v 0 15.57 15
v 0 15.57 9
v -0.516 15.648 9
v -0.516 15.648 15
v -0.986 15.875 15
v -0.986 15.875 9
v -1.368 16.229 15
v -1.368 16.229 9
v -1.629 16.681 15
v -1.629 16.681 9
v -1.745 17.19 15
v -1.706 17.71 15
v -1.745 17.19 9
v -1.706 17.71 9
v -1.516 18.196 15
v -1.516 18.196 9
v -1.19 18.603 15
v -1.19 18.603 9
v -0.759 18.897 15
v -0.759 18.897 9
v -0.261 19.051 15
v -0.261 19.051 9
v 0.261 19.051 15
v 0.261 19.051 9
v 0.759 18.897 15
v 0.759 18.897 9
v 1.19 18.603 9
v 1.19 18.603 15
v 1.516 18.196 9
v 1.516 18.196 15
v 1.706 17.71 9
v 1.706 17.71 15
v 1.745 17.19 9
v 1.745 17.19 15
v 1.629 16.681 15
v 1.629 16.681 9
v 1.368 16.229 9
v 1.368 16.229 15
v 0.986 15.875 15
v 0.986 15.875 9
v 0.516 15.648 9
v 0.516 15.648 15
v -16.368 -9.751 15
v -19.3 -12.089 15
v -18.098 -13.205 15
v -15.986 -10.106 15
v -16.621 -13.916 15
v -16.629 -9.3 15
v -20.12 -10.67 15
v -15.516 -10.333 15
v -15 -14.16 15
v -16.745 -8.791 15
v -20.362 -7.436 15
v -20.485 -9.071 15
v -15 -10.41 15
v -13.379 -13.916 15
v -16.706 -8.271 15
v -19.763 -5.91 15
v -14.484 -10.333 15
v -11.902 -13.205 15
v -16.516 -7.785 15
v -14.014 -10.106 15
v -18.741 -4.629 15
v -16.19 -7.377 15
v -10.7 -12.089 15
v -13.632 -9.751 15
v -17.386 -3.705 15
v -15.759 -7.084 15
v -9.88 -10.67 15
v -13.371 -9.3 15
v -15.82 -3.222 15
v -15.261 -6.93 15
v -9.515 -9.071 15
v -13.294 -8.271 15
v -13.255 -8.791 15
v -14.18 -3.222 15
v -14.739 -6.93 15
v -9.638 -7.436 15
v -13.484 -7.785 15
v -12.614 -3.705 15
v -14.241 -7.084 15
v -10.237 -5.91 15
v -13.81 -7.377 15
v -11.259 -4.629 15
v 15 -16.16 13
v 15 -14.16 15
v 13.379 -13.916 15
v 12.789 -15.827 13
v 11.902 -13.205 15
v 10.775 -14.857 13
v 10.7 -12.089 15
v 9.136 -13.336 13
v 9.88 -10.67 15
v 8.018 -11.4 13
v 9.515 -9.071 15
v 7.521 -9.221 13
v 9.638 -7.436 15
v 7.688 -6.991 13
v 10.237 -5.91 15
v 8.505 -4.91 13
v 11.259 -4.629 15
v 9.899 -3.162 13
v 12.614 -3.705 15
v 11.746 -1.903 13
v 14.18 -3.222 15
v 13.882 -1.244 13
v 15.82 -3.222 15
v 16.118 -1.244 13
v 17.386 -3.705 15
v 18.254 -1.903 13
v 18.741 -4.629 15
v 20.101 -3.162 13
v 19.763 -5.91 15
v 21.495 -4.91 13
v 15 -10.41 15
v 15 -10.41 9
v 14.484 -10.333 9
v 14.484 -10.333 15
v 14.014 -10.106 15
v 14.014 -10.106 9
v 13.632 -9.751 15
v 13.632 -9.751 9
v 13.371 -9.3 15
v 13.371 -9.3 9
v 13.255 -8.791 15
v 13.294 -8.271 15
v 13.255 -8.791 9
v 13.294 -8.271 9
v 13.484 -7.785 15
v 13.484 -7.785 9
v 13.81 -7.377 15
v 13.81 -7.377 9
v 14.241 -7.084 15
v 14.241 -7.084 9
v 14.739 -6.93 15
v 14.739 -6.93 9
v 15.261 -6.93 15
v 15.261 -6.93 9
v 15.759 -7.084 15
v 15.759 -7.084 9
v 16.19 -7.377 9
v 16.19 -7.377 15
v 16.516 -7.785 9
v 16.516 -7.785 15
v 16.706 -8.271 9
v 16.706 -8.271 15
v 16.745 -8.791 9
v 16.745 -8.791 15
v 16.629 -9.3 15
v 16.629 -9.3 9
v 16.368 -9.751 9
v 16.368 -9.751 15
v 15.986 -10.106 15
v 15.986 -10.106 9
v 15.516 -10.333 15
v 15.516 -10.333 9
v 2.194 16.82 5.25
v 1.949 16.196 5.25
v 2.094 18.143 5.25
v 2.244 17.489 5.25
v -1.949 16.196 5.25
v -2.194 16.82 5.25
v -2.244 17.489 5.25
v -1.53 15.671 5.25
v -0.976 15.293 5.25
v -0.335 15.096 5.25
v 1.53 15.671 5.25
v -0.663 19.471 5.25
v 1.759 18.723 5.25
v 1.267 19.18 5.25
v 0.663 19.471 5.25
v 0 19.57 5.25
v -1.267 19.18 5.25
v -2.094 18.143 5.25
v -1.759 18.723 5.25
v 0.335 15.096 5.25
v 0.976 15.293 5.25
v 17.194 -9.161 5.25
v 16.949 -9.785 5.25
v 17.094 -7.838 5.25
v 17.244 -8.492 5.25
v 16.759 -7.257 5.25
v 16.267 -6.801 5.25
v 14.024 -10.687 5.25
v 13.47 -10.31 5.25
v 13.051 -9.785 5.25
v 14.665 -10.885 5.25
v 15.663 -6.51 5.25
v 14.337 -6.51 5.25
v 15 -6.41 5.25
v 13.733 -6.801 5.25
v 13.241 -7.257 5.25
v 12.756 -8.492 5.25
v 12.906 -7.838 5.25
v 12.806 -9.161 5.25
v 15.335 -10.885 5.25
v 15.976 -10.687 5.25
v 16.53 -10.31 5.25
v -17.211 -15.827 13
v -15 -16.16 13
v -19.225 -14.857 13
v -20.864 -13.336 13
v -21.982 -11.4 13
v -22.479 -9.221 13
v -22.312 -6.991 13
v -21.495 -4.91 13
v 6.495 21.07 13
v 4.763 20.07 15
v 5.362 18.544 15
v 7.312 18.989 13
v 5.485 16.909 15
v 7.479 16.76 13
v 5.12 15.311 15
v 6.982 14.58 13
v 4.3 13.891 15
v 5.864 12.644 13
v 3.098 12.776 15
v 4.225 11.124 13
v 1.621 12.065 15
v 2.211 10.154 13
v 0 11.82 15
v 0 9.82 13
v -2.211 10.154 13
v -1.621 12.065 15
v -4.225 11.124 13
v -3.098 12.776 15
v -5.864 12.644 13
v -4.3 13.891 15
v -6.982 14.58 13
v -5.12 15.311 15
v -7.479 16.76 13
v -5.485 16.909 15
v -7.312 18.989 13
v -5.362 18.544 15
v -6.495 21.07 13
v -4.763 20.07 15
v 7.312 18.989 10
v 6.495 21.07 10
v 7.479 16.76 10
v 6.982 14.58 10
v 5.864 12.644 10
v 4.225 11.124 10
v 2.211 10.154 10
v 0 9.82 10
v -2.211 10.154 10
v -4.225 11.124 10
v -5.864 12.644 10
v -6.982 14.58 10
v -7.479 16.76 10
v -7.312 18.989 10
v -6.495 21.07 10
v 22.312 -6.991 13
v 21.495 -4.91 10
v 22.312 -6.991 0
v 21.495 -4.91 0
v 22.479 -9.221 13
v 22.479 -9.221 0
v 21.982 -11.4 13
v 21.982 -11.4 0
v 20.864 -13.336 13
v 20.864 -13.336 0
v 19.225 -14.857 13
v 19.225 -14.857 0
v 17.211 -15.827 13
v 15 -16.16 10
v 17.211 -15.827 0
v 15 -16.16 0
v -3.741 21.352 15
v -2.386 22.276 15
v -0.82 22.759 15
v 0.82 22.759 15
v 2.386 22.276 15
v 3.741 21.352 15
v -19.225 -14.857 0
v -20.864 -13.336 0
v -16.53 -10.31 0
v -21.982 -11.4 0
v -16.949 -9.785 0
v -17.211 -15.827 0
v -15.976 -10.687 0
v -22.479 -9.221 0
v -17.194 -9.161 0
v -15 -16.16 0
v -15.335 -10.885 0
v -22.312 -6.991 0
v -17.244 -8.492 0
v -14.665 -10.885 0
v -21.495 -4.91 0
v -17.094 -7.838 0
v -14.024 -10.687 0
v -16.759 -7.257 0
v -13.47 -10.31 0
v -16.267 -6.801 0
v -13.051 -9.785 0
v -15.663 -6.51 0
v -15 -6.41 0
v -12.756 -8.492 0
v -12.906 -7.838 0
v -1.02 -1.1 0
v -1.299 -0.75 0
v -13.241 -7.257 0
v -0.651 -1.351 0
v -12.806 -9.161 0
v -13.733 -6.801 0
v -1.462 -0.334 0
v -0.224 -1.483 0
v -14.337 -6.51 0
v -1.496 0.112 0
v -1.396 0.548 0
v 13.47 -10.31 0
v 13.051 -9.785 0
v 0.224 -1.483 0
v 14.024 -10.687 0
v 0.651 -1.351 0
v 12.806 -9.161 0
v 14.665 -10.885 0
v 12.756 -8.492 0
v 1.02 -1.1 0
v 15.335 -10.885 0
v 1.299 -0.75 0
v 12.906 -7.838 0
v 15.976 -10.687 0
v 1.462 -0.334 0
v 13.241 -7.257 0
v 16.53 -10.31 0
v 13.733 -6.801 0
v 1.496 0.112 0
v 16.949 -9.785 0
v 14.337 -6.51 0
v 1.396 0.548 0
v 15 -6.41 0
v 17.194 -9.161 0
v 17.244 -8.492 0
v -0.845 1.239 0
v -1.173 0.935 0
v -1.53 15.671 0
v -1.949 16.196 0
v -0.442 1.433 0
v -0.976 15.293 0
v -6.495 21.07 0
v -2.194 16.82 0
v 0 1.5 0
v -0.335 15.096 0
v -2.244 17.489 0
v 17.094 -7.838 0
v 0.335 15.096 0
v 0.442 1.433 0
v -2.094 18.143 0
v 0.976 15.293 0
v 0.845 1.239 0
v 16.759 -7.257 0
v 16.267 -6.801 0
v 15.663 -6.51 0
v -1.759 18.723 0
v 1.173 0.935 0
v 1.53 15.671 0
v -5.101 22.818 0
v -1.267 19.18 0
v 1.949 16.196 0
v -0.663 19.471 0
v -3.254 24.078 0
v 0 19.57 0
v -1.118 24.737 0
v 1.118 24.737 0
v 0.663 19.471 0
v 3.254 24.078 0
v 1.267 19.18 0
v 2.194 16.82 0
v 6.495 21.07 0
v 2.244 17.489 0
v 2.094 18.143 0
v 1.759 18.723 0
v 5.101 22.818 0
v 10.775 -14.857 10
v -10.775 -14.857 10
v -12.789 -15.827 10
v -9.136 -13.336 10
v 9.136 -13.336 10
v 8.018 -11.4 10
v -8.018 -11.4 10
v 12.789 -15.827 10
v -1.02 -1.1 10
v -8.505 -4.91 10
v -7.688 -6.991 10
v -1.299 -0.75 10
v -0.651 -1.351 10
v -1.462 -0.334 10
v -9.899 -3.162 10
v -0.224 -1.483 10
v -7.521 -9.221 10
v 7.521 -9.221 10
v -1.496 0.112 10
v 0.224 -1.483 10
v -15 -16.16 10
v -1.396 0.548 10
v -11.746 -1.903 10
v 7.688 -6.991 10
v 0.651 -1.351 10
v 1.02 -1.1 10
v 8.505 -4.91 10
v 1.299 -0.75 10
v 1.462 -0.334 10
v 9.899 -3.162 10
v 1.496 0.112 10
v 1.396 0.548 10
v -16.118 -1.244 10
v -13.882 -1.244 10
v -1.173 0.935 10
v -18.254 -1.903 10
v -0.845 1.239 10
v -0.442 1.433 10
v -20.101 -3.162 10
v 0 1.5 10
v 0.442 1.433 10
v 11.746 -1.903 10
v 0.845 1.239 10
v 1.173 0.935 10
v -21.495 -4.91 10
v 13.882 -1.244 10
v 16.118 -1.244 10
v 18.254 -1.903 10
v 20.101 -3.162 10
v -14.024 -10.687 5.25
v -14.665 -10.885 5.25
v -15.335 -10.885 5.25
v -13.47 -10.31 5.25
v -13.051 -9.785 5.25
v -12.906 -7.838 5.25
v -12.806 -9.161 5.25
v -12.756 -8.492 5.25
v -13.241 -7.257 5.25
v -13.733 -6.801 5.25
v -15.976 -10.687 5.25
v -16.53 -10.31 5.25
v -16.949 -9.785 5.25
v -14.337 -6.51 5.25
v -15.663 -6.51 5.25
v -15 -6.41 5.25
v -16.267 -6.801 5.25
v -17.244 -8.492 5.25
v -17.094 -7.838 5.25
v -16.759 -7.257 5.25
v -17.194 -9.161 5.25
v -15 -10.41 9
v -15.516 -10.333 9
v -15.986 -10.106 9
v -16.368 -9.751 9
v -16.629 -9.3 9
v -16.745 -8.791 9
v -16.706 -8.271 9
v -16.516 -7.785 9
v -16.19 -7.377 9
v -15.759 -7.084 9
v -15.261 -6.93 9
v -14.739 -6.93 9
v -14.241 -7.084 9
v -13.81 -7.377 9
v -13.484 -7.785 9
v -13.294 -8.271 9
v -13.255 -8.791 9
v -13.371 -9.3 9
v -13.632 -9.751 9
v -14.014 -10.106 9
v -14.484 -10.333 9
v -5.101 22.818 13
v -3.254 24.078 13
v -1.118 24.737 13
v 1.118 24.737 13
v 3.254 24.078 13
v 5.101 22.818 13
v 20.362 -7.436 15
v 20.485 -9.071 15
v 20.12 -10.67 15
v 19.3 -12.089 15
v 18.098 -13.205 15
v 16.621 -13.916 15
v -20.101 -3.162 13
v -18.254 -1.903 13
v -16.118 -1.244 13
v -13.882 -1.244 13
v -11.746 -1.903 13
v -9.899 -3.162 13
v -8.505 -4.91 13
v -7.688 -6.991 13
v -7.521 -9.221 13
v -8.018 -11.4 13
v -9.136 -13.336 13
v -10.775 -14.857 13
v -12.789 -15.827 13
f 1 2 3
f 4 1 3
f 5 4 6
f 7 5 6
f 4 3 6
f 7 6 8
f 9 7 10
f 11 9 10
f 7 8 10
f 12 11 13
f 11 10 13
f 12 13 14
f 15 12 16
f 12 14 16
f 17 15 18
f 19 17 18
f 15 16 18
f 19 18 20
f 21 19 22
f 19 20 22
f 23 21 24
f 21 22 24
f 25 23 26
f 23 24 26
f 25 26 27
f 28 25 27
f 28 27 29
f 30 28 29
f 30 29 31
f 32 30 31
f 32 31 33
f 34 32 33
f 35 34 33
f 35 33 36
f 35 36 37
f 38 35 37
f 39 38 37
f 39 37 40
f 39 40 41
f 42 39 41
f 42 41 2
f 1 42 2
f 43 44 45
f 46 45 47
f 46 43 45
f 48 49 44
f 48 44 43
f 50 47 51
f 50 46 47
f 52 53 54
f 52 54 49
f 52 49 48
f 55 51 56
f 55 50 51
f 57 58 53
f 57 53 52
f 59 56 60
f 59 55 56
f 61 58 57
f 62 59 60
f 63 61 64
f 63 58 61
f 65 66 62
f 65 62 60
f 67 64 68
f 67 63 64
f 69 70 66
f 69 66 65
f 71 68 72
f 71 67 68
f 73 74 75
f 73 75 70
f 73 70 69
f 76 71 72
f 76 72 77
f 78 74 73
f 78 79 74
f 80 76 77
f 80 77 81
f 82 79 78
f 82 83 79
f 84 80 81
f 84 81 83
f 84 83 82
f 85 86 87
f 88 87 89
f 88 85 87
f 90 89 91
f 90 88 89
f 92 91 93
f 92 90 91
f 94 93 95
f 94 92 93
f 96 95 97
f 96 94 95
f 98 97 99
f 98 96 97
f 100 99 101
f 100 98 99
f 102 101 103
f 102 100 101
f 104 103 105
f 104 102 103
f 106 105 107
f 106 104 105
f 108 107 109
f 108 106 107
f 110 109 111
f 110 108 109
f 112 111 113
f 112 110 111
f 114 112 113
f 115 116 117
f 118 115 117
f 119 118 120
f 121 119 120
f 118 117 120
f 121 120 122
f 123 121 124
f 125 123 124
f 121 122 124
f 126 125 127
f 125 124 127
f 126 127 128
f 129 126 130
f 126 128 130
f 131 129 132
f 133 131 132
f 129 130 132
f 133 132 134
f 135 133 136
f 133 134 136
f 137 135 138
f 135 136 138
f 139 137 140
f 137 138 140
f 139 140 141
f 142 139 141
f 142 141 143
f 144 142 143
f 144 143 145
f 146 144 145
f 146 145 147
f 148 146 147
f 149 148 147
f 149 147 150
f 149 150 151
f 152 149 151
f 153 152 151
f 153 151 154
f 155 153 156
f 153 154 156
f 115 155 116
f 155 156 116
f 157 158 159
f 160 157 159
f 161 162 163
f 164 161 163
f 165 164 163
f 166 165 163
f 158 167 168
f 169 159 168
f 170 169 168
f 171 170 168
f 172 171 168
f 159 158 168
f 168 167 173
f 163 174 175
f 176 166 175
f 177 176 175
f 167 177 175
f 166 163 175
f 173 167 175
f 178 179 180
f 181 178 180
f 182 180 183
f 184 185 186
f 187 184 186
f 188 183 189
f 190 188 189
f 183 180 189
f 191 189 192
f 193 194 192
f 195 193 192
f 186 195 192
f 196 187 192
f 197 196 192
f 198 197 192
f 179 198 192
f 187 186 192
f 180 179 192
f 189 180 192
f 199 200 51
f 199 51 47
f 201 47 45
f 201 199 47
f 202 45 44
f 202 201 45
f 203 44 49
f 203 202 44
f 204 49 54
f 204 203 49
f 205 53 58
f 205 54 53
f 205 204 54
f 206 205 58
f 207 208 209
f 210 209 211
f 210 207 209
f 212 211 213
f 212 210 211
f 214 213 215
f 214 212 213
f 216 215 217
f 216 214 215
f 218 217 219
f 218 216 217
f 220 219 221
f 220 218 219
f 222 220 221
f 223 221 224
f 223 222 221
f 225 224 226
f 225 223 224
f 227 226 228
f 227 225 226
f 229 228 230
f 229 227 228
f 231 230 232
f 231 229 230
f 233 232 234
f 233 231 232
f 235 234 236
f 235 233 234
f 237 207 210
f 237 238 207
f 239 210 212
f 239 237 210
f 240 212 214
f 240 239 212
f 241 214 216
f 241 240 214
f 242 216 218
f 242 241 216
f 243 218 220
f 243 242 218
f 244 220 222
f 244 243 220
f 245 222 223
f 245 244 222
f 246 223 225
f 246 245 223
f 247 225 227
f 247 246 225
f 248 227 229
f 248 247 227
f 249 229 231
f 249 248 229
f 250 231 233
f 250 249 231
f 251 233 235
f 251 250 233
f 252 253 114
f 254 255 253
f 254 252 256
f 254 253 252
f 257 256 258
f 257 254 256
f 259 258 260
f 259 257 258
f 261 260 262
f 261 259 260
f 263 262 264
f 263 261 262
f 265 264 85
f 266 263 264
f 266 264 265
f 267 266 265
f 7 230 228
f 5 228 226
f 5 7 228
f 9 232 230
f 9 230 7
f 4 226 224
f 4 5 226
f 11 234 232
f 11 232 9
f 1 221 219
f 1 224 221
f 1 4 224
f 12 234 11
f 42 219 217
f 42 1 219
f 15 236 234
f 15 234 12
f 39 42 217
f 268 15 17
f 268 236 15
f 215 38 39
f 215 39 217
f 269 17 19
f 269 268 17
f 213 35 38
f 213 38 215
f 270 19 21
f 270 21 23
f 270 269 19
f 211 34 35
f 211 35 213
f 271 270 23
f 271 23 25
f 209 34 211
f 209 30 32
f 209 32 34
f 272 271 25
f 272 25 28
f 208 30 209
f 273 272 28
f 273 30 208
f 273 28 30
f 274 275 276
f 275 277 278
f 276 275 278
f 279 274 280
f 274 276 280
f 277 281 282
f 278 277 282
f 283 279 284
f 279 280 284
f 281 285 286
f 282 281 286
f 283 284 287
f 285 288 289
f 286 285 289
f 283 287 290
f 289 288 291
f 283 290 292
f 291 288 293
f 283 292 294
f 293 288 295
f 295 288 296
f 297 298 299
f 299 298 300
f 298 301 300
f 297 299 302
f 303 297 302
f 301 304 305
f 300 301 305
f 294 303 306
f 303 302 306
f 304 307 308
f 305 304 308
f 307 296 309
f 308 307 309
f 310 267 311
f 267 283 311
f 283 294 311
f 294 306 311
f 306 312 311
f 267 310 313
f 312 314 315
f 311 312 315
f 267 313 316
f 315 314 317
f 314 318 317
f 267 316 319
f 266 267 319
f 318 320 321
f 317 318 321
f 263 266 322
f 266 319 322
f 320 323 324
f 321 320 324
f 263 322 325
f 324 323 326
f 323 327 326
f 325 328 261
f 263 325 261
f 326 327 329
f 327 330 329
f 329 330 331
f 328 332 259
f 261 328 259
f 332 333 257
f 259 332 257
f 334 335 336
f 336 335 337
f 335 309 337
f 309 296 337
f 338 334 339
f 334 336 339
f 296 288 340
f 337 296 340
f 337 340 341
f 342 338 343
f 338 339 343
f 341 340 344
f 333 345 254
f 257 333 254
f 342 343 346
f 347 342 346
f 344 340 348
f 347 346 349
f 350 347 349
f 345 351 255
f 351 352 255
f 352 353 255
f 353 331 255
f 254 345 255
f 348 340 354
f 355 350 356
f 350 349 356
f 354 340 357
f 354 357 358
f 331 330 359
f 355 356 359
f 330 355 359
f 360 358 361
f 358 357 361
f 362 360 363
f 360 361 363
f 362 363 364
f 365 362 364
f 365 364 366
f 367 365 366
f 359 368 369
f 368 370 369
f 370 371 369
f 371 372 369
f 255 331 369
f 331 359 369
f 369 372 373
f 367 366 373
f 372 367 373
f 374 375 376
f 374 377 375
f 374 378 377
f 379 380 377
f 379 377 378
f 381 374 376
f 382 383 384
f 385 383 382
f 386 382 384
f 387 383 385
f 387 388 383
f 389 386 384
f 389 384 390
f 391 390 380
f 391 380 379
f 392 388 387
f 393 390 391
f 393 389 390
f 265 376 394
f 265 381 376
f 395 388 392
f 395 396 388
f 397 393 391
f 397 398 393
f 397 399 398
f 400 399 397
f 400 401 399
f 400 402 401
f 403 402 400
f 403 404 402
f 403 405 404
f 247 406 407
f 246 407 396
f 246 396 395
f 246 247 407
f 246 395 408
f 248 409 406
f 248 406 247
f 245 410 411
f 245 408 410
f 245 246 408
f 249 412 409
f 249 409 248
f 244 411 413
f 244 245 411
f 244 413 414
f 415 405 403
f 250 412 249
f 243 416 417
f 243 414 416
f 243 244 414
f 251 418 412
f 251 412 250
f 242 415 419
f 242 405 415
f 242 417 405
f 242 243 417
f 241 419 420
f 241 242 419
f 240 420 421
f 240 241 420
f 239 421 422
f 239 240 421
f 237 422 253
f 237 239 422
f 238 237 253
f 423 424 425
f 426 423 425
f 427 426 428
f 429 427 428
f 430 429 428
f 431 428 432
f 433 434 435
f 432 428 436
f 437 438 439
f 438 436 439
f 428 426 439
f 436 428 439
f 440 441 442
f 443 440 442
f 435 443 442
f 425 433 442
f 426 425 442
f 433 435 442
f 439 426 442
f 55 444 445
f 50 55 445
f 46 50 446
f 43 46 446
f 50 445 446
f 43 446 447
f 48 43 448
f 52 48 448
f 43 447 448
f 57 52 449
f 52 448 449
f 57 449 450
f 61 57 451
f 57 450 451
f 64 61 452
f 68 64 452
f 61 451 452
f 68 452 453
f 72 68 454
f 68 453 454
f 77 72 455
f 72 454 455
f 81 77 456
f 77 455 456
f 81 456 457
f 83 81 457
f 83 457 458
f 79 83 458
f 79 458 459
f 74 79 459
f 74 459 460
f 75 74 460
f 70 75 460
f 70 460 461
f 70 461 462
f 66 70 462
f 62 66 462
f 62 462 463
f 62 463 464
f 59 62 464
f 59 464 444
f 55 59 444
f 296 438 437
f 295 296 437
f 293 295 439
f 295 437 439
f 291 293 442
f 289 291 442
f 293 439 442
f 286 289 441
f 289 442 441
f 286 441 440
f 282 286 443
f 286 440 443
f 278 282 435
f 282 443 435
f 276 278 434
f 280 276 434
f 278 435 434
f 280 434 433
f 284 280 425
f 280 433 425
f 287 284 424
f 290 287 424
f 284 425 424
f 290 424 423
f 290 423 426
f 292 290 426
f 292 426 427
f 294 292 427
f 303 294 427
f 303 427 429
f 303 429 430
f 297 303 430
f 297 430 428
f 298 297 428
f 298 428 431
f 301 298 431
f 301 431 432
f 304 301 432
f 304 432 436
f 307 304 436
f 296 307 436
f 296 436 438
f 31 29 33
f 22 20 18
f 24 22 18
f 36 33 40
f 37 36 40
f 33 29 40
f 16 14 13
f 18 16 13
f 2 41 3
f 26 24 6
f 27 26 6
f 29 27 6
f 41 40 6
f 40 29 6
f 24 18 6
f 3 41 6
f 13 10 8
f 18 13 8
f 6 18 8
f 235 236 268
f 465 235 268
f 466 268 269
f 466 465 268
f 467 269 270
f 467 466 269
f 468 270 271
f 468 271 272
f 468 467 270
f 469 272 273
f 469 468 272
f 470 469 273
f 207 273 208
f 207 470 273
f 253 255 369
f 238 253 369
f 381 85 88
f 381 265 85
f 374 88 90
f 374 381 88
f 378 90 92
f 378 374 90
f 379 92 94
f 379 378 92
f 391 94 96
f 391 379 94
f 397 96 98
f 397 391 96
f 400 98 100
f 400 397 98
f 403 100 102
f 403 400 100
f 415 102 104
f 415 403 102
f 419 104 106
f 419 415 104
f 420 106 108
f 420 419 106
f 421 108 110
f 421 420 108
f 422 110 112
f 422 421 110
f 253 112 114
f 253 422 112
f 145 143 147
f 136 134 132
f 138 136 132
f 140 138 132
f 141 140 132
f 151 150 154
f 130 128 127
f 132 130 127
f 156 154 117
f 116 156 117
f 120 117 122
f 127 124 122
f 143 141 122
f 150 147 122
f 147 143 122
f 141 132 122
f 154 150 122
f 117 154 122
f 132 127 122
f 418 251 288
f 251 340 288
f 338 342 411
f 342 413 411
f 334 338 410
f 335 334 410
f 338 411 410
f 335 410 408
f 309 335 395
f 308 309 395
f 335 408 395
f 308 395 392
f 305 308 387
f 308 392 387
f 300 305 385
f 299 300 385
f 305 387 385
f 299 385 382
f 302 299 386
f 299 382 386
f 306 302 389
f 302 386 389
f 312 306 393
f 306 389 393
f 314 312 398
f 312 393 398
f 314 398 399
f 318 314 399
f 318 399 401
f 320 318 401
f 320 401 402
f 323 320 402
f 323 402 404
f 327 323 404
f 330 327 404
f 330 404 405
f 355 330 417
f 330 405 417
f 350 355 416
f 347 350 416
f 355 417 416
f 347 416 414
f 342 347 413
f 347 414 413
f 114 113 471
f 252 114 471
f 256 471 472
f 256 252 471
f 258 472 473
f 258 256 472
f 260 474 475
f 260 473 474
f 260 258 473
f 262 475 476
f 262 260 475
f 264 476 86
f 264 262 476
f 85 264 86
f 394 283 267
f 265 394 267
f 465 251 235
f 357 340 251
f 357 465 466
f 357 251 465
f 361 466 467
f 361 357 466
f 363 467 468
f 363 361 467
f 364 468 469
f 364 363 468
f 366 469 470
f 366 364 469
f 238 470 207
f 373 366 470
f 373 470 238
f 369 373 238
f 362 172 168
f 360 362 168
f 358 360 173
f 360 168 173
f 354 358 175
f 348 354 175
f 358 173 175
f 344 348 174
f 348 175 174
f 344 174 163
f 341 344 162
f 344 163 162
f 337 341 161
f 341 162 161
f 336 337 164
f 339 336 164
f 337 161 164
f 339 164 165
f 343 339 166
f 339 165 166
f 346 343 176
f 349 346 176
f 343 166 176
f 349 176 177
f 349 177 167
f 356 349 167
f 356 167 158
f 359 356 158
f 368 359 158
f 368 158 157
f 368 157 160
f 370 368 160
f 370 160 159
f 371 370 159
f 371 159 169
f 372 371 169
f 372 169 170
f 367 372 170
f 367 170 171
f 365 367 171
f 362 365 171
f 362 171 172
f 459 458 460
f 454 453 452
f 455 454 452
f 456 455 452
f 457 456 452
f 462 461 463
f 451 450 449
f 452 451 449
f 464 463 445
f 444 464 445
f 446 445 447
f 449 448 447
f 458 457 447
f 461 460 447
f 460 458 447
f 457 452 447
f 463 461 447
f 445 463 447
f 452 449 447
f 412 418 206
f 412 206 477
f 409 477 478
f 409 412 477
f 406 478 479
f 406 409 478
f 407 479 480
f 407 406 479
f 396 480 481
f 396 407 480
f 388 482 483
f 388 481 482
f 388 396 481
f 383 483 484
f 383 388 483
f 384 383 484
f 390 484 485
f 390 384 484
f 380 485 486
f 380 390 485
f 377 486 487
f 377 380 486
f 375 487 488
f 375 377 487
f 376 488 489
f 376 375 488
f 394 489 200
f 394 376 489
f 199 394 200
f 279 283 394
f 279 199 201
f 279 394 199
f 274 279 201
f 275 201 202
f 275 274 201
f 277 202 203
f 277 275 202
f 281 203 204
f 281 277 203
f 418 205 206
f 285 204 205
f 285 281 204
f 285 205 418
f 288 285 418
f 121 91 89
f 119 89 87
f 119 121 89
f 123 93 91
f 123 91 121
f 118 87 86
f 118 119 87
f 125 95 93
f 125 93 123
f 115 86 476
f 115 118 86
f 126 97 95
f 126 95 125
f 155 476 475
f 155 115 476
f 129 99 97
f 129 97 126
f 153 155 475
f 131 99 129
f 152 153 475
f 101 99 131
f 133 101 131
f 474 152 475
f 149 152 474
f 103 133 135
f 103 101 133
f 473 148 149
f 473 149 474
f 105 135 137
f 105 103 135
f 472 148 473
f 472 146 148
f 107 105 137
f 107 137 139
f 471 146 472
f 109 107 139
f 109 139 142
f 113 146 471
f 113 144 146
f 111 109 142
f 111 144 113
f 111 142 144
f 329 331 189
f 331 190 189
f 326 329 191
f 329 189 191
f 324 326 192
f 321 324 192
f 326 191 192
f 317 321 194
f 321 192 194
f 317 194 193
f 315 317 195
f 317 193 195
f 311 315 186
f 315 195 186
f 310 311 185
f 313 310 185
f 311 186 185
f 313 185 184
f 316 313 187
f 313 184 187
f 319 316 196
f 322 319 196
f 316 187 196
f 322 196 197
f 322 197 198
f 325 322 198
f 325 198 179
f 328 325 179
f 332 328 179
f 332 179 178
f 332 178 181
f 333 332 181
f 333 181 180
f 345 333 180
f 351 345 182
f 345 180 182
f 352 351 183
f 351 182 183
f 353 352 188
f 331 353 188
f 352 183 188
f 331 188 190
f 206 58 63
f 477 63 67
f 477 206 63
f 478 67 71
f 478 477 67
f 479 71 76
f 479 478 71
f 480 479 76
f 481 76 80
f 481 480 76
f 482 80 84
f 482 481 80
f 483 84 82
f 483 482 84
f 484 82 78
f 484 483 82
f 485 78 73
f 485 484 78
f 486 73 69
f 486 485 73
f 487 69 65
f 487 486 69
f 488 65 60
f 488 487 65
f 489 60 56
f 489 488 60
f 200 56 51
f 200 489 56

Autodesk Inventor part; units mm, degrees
ref_plane "YZ Plane" through (0, 0, 0) normal (1, 0, 0) x (0, 1, 0)
ref_plane "XZ Plane" through (0, 0, 0) normal (0, 1, 0) x (-1, 0, 0)
ref_plane "XY Plane" through (0, 0, 0) normal (0, 0, 1) x (1, 0, 0)
sketch "Sketch1" plane through (0, 0, 0) normal (0, 0, 1) x (1, 0, 0)
  circle A0 centre (0, 0) radius 2 projected
  circle A1 centre (0, 17.3205) radius 2 projected
  circle A2 centre (-15, -8.6603) radius 2 projected
  circle A3 centre (15, -8.6603) radius 2 projected
  line L0 (-15, -16.1603) -> (15, -16.1603)
  line L1 (21.4952, -4.9103) -> (6.4952, 21.0705)
  line L2 (-6.4952, 21.0705) -> (-21.4952, -4.9103)
  arc A4 (6.4952, 21.0705) -> (-6.4952, 21.0705) centre (0, 17.3205) ccw
  arc A5 (15, -16.1603) -> (21.4952, -4.9103) centre (15, -8.6603) ccw
  arc A6 (-21.4952, -4.9103) -> (-15, -16.1603) centre (-15, -8.6603) ccw
  line L3 (15.512, -26.8675) -> (-15.512, -26.8675) projected
  line L4 (15.512, 26.8675) -> (31.0239, 0) projected
  line L5 (-31.0239, 0) -> (-15.512, 26.8675) projected
  line L6 (-31.0239, 0) -> (-15.512, -26.8675) projected
  line L7 (15.512, -26.8675) -> (31.0239, 0) projected
  line L8 (15.512, 26.8675) -> (-15.512, 26.8675) projected
  point P0 (0, 0)
  dimension "d3" = 7.5
extrude "Extrusion1" add sketch "Sketch1" along normal blind 10 contours A0 | A1 | A2 | A3 | A6 L2 A4 L1 A5 L0
sketch "Sketch2" plane through (0, 0, 0) normal (0, 0, -1) x (-1, 0, 0)
  arc A0 (15, -16.1603) -> (21.4952, -4.9103) centre (15, -8.6603) ccw projected
  arc A1 (6.4952, 21.0705) -> (-6.4952, 21.0705) centre (0, 17.3205) ccw projected
  arc A2 (-21.4952, -4.9103) -> (-15, -16.1603) centre (-15, -8.6603) ccw projected
  point P0 (0, 0)
hole "Hole1" at (0, 17.3205, 0) at (15, -8.6603, 0) at (-15, -8.6603, 0) direction (0, 0, 1) diameter 4.5 depth 5.25
sketch "Sketch3" plane through (0, 0, 0) normal (0, 0, -1) x (-1, 0, 0)
  point P0 (0, 0)
hole "Hole2" at (0, 0, 0) direction (0, 0, 1) diameter 3 end through all
sketch "Sketch4" plane through (0, 0, 10) normal (0, 0, 1) x (1, 0, 0)
  arc A0 (15, -16.1603) -> (21.4952, -4.9103) centre (15, -8.6603) ccw projected
  arc A1 (6.4952, 21.0705) -> (-6.4952, 21.0705) centre (0, 17.3205) ccw projected
  arc A2 (-21.4952, -4.9103) -> (-15, -16.1603) centre (-15, -8.6603) ccw projected
  circle A3 centre (0, 17.3205) radius 7.5
  circle A4 centre (15, -8.6603) radius 7.5
  circle A5 centre (-15, -8.6603) radius 7.5
extrude "Extrusion2" add sketch "Sketch4" along normal blind 5
chamfer "Chamfer1" distance 2 angle 45 3 edges at (-22.5, -8.6603, 15) (-7.5, 17.3205, 15) (7.5, -8.6603, 15)
hole "Hole3" at (0, 17.3205, 15) direction (0, 0, -1) diameter 3.5 depth 6
hole "Hole4" at (15, -8.6603, 15) direction (0, 0, -1) diameter 3.5 depth 6
hole "Hole5" at (-15, -8.6603, 15) direction (0, 0, -1) diameter 3.5 depth 6
properties part number "ShellFrame"
